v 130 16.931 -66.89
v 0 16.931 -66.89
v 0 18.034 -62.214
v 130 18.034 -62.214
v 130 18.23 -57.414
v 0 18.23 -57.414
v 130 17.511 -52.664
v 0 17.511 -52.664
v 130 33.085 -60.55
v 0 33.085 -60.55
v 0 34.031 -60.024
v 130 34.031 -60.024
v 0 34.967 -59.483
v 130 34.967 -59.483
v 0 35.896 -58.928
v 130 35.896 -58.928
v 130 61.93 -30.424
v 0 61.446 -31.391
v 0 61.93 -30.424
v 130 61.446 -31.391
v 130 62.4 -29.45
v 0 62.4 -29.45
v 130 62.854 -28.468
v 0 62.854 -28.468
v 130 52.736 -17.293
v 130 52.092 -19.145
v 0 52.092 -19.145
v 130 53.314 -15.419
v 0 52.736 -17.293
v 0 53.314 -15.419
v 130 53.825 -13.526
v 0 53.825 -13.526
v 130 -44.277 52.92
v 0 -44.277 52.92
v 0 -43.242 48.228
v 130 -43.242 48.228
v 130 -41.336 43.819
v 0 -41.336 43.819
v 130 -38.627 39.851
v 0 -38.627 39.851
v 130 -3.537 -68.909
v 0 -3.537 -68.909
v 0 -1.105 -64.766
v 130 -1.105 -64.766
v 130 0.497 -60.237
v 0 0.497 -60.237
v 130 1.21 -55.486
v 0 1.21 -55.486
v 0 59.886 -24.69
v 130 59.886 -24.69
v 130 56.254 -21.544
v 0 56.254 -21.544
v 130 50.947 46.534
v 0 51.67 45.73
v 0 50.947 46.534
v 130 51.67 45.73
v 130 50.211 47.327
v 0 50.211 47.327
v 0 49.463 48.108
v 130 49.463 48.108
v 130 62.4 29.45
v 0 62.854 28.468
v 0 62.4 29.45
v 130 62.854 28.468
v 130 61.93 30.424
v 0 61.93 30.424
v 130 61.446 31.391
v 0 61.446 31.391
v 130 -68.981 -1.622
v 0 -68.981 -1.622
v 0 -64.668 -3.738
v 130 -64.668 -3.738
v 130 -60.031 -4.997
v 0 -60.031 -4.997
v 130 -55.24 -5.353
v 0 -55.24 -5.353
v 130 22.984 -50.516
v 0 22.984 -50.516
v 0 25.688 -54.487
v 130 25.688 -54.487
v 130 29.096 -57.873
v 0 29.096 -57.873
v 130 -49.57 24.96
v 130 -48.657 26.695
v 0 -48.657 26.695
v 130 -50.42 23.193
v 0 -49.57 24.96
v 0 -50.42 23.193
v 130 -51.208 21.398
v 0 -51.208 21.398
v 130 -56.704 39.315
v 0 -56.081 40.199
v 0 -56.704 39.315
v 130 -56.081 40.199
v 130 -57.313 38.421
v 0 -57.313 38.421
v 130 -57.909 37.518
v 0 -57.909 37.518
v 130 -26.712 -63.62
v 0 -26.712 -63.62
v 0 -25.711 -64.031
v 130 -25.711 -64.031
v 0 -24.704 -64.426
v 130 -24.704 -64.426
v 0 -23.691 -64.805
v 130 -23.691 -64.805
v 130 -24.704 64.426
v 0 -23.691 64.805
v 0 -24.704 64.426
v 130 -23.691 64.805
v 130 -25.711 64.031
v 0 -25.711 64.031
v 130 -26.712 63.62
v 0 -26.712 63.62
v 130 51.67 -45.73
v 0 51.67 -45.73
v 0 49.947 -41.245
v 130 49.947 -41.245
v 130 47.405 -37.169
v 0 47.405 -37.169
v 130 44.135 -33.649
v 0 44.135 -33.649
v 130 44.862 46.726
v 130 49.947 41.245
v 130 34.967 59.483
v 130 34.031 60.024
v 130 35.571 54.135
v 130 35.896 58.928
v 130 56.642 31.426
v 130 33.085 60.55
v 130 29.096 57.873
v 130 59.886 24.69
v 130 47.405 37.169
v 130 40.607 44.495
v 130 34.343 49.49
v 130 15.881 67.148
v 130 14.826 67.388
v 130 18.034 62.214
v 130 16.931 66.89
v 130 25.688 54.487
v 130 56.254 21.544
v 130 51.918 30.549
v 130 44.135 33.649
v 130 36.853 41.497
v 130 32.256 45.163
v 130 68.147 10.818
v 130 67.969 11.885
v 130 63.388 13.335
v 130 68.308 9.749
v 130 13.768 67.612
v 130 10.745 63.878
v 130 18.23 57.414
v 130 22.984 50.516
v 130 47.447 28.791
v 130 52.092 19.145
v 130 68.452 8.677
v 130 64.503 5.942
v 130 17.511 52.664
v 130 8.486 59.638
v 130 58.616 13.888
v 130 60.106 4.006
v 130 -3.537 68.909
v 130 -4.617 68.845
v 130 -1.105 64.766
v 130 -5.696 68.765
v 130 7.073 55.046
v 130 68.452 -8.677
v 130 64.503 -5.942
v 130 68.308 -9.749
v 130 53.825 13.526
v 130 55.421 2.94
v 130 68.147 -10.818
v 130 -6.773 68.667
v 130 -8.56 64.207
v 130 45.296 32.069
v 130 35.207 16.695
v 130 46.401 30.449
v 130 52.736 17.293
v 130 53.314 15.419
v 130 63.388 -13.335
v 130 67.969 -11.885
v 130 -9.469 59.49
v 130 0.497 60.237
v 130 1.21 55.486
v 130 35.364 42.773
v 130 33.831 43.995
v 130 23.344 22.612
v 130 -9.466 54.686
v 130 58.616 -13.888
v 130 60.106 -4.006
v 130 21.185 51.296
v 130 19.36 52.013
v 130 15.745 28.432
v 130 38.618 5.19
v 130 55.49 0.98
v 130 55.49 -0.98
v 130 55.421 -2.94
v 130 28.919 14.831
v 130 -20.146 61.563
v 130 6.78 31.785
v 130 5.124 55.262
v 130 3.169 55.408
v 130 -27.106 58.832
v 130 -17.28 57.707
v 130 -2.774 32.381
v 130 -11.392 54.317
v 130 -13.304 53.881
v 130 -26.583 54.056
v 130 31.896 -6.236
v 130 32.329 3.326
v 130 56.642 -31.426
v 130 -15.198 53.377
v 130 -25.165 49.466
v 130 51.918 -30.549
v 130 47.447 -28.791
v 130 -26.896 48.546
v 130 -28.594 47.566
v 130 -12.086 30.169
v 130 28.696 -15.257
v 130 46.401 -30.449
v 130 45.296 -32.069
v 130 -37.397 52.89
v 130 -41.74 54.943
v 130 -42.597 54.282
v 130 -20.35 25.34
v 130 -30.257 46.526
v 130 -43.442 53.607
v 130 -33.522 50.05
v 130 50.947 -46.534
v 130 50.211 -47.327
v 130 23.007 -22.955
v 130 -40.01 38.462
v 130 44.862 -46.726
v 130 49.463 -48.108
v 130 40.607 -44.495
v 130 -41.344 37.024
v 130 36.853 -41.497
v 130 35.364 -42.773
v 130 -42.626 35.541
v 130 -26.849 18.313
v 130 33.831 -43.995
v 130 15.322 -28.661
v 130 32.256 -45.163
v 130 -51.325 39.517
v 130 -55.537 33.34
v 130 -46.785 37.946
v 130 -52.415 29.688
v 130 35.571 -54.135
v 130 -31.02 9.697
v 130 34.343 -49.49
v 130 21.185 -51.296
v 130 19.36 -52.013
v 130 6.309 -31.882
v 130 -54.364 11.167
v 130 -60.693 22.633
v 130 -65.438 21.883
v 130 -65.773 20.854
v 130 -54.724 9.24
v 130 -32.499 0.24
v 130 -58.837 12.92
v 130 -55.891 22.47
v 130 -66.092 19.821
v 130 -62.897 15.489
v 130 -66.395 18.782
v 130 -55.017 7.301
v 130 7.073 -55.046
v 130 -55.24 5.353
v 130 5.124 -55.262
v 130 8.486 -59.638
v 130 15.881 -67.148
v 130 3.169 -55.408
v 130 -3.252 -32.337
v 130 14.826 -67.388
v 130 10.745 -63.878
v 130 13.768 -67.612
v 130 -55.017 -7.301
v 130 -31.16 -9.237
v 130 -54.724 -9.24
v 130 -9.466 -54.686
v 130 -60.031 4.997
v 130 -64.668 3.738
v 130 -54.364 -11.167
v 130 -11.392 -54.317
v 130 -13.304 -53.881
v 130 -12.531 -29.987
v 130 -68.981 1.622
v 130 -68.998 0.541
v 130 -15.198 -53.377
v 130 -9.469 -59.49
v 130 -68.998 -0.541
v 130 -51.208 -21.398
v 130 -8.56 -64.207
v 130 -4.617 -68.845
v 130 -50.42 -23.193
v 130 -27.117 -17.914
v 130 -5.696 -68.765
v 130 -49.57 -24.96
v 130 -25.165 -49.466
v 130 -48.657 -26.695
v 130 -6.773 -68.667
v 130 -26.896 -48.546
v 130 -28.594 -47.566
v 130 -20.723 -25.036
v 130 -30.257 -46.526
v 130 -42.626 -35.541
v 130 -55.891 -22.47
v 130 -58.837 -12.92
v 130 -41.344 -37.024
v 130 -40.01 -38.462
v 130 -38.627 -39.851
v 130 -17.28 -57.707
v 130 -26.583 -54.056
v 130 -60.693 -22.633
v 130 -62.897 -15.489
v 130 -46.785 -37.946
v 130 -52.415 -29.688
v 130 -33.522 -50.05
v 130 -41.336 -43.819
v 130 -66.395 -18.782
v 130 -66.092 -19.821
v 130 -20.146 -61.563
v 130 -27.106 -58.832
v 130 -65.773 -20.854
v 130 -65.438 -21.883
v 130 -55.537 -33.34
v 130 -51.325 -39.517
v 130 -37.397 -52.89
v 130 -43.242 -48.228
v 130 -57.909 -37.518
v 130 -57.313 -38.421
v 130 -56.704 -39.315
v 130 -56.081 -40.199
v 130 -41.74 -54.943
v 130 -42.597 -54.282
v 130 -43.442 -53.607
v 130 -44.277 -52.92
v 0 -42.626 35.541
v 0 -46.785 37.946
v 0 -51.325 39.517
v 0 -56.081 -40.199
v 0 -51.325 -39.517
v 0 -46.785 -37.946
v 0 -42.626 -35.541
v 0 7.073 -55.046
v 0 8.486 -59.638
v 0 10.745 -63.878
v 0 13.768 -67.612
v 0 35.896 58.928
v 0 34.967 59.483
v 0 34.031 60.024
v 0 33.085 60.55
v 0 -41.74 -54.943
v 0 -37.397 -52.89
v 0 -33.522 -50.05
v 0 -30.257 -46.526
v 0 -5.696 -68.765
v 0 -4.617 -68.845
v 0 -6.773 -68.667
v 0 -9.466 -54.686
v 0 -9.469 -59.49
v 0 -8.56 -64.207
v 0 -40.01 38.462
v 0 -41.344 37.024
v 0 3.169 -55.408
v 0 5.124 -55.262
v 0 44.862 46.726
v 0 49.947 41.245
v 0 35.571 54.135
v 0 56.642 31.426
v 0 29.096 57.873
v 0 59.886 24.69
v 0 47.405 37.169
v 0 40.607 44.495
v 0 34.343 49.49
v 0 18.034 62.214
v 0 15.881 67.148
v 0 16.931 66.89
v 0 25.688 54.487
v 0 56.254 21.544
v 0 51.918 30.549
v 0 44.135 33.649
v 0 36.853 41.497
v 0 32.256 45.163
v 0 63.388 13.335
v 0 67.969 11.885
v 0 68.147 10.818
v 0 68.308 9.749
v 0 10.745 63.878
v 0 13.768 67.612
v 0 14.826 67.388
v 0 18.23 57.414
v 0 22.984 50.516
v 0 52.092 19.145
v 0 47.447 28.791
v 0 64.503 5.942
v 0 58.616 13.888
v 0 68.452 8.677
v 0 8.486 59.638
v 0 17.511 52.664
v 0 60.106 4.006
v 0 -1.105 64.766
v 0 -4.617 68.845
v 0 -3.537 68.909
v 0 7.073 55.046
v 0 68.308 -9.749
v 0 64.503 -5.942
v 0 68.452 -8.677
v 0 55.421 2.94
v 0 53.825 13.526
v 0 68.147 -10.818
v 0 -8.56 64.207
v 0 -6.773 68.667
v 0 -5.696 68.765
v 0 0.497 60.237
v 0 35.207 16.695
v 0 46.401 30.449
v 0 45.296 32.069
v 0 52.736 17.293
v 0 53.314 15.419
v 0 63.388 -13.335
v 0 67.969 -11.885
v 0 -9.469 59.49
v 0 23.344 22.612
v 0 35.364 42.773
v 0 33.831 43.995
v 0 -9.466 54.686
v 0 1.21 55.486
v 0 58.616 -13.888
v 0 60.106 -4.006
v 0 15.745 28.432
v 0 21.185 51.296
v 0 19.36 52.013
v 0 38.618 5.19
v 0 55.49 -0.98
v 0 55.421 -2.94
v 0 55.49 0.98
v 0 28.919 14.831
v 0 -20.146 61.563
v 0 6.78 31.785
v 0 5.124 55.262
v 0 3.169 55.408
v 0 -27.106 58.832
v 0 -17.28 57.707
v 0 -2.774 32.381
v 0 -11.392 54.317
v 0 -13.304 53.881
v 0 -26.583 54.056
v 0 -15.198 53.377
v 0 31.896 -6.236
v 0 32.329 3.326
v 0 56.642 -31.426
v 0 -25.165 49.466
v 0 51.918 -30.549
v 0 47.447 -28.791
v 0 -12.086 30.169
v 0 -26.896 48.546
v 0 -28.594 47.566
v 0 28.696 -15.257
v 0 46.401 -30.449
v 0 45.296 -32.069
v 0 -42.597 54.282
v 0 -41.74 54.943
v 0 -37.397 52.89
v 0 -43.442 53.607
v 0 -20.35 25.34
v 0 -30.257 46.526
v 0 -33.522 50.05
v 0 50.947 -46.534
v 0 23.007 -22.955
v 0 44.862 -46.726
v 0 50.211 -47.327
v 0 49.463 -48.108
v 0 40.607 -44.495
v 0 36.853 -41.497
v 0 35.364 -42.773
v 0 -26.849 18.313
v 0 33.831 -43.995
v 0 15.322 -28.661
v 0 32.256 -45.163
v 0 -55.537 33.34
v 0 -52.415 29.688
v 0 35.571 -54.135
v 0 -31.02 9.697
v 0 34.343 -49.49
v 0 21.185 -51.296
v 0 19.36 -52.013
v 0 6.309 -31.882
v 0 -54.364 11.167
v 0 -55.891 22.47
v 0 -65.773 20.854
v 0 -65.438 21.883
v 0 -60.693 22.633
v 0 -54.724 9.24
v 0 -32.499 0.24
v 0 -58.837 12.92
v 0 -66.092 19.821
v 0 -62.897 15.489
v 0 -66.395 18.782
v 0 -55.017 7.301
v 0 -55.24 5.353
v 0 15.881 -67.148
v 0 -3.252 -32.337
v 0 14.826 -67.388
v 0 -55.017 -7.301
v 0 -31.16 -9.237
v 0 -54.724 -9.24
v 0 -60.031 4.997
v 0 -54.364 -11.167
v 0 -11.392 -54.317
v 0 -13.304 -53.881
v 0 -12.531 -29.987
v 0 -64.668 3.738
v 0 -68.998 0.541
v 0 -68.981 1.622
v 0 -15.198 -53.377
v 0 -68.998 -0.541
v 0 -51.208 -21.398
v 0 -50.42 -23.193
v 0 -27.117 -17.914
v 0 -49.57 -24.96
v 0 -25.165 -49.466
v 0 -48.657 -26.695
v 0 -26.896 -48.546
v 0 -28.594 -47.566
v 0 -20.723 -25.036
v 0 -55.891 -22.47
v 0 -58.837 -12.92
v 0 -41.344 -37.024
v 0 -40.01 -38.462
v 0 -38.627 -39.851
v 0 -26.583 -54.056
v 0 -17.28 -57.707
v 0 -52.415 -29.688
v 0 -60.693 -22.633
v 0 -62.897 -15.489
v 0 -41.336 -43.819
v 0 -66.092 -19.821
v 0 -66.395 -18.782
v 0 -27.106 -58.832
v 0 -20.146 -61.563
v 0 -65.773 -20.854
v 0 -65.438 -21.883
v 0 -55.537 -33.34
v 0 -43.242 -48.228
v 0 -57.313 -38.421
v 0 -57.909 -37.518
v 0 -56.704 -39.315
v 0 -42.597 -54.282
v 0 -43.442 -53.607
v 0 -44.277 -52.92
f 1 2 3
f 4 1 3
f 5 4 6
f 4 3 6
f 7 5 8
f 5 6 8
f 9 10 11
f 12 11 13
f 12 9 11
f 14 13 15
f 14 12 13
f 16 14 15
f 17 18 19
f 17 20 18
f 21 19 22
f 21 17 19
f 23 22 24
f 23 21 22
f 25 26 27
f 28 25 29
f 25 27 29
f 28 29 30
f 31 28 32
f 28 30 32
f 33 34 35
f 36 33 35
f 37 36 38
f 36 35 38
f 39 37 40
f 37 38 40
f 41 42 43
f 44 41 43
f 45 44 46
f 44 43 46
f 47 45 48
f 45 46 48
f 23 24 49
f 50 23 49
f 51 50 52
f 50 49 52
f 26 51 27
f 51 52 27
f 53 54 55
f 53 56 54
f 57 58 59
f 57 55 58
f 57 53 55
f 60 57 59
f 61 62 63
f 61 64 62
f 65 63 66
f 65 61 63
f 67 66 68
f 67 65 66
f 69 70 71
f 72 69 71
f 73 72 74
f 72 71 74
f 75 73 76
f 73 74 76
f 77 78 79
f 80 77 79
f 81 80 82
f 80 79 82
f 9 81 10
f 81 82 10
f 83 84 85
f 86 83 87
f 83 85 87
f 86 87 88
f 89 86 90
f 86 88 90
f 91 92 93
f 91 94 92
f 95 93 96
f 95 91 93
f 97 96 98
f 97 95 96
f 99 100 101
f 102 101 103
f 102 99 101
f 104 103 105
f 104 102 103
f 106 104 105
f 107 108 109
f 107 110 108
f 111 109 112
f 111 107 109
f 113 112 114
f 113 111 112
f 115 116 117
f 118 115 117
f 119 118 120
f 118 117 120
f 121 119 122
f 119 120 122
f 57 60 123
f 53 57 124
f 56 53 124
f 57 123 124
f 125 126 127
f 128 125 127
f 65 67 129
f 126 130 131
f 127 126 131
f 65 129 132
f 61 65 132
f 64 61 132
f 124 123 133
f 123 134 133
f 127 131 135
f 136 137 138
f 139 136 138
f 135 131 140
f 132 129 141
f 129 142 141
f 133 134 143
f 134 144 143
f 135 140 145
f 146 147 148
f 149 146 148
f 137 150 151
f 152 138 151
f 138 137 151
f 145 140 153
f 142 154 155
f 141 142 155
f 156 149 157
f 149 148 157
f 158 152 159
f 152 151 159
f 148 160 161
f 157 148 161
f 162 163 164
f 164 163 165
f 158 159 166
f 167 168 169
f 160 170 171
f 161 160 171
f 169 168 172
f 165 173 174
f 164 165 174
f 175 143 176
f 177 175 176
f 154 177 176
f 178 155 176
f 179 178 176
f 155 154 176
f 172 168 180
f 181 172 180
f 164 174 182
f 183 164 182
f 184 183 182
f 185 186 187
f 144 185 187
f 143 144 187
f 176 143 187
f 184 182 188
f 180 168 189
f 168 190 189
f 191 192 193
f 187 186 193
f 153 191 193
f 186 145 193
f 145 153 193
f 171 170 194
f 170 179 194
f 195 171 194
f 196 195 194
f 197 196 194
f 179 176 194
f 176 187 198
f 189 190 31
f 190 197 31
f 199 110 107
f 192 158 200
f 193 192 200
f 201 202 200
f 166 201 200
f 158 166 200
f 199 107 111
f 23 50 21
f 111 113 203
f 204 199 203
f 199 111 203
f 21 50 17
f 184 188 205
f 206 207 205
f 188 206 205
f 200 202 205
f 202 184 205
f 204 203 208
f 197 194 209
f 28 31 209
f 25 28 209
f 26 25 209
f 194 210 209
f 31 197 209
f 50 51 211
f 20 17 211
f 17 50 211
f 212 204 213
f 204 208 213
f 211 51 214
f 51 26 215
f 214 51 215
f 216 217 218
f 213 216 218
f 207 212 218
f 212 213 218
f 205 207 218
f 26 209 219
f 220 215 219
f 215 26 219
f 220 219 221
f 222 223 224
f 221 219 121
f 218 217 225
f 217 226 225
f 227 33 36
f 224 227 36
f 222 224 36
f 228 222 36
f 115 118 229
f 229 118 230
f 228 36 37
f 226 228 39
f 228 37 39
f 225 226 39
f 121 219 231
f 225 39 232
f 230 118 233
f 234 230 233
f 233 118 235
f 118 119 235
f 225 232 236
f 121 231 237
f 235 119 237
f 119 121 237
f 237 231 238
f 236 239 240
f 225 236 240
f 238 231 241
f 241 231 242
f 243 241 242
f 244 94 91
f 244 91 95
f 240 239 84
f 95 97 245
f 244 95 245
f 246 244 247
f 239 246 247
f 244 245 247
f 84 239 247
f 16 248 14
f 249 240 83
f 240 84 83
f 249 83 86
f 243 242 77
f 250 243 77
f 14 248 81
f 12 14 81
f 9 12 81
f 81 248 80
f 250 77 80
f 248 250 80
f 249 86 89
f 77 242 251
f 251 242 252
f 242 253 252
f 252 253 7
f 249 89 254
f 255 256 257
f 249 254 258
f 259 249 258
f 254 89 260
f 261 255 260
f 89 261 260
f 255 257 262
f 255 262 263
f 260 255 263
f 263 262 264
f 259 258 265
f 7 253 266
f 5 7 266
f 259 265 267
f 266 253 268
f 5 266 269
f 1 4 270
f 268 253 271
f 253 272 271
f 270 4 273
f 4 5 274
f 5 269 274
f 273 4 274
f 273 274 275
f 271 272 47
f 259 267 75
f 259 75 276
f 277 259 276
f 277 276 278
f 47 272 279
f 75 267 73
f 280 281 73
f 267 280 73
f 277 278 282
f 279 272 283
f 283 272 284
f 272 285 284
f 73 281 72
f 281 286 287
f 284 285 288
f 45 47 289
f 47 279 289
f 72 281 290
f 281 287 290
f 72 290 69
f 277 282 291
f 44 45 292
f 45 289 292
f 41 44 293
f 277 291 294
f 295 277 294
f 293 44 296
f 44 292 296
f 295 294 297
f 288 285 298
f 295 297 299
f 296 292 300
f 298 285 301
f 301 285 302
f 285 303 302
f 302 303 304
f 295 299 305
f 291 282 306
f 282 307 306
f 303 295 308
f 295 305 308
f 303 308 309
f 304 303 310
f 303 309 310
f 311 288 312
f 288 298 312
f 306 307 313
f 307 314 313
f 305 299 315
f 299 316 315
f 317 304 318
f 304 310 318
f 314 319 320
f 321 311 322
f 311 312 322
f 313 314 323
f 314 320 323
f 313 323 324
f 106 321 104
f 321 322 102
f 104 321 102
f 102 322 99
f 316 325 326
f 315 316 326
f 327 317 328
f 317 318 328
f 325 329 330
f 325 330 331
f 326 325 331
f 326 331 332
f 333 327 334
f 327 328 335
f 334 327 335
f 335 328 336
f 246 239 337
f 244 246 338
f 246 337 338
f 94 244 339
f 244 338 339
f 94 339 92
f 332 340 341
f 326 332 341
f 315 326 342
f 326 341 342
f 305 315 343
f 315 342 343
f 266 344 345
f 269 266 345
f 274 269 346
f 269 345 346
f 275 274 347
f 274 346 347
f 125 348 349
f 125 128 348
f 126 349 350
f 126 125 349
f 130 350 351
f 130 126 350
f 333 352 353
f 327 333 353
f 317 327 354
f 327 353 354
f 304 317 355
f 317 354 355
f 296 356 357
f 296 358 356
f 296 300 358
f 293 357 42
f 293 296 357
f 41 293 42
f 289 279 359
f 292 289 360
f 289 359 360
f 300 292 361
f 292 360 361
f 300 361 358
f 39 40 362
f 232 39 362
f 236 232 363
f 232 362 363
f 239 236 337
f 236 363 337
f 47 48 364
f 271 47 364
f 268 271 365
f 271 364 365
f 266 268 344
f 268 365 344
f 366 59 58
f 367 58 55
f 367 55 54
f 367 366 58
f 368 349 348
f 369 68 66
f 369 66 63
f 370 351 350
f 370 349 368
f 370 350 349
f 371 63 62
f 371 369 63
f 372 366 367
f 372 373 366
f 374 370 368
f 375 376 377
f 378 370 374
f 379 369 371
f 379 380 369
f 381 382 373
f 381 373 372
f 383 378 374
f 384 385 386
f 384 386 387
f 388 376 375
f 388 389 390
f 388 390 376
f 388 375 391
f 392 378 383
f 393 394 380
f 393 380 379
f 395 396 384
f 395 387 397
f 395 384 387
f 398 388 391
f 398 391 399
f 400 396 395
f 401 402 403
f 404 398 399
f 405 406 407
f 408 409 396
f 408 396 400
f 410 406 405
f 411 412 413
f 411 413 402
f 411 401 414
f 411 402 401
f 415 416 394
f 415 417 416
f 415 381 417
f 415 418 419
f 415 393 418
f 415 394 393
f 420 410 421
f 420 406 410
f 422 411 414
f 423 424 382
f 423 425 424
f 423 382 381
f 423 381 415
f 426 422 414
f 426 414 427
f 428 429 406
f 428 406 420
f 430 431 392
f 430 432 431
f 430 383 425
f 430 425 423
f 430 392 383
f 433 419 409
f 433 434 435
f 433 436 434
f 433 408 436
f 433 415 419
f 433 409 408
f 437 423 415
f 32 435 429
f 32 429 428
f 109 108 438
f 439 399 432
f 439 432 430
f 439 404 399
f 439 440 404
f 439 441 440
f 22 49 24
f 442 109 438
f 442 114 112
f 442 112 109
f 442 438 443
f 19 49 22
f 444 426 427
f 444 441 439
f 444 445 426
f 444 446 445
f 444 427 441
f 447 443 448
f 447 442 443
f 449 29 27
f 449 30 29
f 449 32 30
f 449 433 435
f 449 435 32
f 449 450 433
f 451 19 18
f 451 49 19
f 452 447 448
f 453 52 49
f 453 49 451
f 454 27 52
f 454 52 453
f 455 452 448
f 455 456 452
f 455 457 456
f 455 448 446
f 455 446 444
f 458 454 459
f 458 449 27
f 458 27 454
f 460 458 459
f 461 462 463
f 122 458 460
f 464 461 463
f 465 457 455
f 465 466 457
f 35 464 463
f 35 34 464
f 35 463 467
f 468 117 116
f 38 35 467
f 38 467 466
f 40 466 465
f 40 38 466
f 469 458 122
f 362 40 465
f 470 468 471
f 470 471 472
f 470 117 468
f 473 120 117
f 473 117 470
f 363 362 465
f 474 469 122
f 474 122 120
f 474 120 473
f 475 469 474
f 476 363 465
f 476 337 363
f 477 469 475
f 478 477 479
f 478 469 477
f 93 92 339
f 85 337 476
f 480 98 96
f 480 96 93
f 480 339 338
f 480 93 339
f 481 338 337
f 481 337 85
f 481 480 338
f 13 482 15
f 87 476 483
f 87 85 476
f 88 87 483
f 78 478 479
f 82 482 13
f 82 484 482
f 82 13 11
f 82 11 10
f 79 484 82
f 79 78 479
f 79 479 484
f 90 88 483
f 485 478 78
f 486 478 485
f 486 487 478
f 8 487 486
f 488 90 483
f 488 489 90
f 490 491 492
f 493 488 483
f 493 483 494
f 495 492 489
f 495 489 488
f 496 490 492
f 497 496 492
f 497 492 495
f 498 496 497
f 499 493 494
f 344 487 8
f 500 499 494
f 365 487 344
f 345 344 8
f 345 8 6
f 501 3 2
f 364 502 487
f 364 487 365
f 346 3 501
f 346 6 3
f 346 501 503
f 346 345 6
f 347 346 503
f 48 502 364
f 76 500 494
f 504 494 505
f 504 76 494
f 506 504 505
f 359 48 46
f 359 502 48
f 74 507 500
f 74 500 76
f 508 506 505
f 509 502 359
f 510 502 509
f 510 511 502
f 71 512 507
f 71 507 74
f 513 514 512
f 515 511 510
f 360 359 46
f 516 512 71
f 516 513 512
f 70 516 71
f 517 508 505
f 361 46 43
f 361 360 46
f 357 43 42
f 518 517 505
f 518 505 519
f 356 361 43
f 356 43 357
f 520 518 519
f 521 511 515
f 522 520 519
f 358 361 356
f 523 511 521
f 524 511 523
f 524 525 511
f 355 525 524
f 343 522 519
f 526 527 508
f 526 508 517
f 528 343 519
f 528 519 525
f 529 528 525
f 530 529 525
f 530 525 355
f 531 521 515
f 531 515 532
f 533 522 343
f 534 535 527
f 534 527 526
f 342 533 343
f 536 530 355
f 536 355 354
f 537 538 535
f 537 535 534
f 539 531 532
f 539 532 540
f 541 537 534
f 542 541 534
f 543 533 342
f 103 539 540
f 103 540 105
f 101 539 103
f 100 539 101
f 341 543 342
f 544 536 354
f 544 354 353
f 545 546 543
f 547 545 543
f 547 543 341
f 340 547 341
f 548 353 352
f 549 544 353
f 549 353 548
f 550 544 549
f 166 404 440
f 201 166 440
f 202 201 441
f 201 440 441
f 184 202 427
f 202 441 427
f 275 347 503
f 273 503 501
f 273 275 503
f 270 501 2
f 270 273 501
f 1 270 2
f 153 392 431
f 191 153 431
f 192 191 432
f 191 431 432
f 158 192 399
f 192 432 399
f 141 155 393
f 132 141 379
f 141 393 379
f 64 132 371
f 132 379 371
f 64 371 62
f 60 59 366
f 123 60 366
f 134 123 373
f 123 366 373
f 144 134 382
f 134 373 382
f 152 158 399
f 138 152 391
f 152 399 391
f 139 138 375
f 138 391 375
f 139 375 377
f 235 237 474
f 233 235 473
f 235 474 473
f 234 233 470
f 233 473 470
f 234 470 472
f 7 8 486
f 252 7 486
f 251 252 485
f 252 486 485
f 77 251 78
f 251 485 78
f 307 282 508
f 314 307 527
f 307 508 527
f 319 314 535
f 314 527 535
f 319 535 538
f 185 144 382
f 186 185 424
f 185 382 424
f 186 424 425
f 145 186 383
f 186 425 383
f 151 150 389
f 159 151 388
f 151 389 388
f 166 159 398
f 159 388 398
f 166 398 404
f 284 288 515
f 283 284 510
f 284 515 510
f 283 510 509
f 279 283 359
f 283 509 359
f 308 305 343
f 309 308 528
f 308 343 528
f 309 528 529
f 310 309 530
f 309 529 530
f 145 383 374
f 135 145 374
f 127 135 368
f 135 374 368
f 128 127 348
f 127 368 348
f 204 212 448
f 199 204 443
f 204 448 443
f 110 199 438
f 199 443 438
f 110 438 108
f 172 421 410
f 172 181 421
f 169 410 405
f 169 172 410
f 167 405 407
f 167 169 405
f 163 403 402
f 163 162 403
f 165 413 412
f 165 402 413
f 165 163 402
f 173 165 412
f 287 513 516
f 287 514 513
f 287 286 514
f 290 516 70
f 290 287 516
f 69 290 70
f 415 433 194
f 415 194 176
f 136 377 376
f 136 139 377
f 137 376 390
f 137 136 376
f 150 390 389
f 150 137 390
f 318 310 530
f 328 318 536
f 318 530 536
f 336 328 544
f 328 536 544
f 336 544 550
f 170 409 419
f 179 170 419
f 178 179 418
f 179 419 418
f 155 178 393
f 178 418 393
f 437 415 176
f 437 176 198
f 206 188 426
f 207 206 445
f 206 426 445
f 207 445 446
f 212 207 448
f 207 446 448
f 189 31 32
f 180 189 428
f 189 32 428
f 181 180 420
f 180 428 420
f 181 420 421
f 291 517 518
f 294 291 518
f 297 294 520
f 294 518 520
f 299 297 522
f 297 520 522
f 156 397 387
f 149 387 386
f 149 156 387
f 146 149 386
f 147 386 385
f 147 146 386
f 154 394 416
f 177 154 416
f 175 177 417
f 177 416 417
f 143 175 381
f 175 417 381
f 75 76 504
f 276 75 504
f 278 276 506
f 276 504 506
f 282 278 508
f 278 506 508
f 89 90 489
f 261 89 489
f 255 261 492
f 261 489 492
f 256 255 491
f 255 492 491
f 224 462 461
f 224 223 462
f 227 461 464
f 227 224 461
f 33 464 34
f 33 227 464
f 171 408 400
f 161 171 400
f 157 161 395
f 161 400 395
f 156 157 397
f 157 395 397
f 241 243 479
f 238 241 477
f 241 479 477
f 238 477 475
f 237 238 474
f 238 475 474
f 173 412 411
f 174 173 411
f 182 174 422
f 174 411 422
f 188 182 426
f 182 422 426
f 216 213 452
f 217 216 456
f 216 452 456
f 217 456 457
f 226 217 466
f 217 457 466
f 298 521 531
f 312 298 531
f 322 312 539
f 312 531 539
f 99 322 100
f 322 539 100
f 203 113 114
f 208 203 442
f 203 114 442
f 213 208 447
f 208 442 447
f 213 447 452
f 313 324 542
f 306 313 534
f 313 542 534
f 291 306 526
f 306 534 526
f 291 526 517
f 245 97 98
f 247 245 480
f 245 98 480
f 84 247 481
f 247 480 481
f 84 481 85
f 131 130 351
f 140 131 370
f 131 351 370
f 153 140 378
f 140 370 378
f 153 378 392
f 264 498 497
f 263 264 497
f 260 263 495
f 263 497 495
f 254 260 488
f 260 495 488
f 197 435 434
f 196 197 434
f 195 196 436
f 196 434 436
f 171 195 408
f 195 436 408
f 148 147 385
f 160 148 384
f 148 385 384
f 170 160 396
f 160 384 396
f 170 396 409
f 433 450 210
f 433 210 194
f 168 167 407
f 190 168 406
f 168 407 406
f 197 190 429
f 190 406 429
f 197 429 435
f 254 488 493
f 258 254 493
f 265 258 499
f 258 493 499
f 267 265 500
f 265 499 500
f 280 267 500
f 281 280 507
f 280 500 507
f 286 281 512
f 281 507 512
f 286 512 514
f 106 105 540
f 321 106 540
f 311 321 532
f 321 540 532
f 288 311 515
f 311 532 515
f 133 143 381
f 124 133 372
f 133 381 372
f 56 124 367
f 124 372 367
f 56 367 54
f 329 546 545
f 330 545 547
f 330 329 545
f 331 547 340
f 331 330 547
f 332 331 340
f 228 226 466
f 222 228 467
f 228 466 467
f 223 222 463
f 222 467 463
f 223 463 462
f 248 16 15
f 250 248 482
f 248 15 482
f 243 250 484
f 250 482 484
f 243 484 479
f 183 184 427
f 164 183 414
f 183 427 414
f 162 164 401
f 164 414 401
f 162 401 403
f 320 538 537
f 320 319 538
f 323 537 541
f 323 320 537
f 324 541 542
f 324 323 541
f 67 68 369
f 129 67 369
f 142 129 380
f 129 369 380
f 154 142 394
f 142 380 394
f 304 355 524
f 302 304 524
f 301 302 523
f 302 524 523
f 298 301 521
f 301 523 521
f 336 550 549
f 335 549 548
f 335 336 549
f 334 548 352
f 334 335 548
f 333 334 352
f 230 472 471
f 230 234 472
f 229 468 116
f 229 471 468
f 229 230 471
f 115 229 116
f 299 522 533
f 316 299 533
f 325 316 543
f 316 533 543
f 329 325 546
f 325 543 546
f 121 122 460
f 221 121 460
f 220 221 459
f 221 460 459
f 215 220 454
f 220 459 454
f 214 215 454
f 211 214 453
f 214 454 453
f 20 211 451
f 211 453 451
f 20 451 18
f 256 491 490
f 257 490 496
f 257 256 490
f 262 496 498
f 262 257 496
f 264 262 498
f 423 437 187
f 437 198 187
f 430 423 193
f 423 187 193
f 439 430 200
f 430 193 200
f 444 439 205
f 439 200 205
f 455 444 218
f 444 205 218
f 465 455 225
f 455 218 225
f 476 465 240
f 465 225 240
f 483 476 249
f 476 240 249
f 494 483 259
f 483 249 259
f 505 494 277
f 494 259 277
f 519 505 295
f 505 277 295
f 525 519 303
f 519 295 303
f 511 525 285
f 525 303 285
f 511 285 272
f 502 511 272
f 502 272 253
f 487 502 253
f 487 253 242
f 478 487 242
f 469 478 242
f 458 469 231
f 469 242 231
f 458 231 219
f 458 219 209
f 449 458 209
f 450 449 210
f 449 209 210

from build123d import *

# Parameters (mm, degrees)
BASPROSKE_W        = 130
BASPROSKE_H        = 69
TOOTHCUT_DEPTH     = 163.548454314
TEETHCUTS_COUNT    = 21
TEETHCUTS_ANGLE    = 342.857142857
BORSKE_R           = 32.5
BORE_DEPTH         = 130.0000508
CUT_EXTRUDE1_DEPTH = 163.509966704


with BuildPart() as part:
    # BasProSke → Base-Revolve (revolve)
    with BuildSketch(Plane(origin=(0, 0, 0), x_dir=(1, 0, 0), z_dir=(0, 1, 0)), mode=Mode.PRIVATE) as base_revolve_sk:
        with Locations((65, 34.5)):
            Rectangle(BASPROSKE_W, BASPROSKE_H)
    revolve(base_revolve_sk.sketch.rotate(Axis((-10, 0, 0), (1, 0, 0)), 180), axis=Axis((-10, 0, 0), (1, 0, 0)))

    # TooCutSke → ToothCut (cut, through all)
    with BuildSketch(Plane(origin=(0, 0, 0), x_dir=(0, 0, -1), z_dir=(1, 0, 0))):
        with BuildLine():
            ThreePointArc((2.93985266, 55.421081434), (0, 55.499), (-2.93985266, 55.421081434))
            ThreePointArc((-2.93985266, 55.421081434), (-4.874938915, 62.364127365), (-8.696301499, 68.475398395))
            ThreePointArc((-8.696301499, 68.475398395), (0, 69.0254), (8.696301499, 68.475398395))
            ThreePointArc((8.696301499, 68.475398395), (4.874938915, 62.364127365), (2.93985266, 55.421081434))
        make_face()
    toothcut = extrude(amount=TOOTHCUT_DEPTH, mode=Mode.SUBTRACT)

    # TeethCuts: ToothCut ×21 about axis
    teethcuts_axis = Axis((-10, 0, 0), (1, 0, 0))
    for i in range(1, TEETHCUTS_COUNT):
        add(toothcut.rotate(teethcuts_axis, i * TEETHCUTS_ANGLE / (TEETHCUTS_COUNT - 1)), mode=Mode.SUBTRACT)

    # BorSke → Bore (cut, symmetric)
    with BuildSketch(Plane(origin=(0, 0, 0), x_dir=(0, 0, -1), z_dir=(1, 0, 0))):
        with Locations(Location((0, 0, 0), (0, 0, 180))):
            Circle(BORSKE_R)
    extrude(amount=BORE_DEPTH, both=True, mode=Mode.SUBTRACT)

    # Sketch1 → Cut-Extrude1 (cut, through all)
    with BuildSketch(Plane.ZY):
        Polygon((16.6951355, 35.206852325), (13.284459239, 23.701754001), (1.779360915, 27.112430262), (5.190037177, 38.617528586), align=None)
    extrude(amount=-CUT_EXTRUDE1_DEPTH, mode=Mode.SUBTRACT)


solid = part.part
